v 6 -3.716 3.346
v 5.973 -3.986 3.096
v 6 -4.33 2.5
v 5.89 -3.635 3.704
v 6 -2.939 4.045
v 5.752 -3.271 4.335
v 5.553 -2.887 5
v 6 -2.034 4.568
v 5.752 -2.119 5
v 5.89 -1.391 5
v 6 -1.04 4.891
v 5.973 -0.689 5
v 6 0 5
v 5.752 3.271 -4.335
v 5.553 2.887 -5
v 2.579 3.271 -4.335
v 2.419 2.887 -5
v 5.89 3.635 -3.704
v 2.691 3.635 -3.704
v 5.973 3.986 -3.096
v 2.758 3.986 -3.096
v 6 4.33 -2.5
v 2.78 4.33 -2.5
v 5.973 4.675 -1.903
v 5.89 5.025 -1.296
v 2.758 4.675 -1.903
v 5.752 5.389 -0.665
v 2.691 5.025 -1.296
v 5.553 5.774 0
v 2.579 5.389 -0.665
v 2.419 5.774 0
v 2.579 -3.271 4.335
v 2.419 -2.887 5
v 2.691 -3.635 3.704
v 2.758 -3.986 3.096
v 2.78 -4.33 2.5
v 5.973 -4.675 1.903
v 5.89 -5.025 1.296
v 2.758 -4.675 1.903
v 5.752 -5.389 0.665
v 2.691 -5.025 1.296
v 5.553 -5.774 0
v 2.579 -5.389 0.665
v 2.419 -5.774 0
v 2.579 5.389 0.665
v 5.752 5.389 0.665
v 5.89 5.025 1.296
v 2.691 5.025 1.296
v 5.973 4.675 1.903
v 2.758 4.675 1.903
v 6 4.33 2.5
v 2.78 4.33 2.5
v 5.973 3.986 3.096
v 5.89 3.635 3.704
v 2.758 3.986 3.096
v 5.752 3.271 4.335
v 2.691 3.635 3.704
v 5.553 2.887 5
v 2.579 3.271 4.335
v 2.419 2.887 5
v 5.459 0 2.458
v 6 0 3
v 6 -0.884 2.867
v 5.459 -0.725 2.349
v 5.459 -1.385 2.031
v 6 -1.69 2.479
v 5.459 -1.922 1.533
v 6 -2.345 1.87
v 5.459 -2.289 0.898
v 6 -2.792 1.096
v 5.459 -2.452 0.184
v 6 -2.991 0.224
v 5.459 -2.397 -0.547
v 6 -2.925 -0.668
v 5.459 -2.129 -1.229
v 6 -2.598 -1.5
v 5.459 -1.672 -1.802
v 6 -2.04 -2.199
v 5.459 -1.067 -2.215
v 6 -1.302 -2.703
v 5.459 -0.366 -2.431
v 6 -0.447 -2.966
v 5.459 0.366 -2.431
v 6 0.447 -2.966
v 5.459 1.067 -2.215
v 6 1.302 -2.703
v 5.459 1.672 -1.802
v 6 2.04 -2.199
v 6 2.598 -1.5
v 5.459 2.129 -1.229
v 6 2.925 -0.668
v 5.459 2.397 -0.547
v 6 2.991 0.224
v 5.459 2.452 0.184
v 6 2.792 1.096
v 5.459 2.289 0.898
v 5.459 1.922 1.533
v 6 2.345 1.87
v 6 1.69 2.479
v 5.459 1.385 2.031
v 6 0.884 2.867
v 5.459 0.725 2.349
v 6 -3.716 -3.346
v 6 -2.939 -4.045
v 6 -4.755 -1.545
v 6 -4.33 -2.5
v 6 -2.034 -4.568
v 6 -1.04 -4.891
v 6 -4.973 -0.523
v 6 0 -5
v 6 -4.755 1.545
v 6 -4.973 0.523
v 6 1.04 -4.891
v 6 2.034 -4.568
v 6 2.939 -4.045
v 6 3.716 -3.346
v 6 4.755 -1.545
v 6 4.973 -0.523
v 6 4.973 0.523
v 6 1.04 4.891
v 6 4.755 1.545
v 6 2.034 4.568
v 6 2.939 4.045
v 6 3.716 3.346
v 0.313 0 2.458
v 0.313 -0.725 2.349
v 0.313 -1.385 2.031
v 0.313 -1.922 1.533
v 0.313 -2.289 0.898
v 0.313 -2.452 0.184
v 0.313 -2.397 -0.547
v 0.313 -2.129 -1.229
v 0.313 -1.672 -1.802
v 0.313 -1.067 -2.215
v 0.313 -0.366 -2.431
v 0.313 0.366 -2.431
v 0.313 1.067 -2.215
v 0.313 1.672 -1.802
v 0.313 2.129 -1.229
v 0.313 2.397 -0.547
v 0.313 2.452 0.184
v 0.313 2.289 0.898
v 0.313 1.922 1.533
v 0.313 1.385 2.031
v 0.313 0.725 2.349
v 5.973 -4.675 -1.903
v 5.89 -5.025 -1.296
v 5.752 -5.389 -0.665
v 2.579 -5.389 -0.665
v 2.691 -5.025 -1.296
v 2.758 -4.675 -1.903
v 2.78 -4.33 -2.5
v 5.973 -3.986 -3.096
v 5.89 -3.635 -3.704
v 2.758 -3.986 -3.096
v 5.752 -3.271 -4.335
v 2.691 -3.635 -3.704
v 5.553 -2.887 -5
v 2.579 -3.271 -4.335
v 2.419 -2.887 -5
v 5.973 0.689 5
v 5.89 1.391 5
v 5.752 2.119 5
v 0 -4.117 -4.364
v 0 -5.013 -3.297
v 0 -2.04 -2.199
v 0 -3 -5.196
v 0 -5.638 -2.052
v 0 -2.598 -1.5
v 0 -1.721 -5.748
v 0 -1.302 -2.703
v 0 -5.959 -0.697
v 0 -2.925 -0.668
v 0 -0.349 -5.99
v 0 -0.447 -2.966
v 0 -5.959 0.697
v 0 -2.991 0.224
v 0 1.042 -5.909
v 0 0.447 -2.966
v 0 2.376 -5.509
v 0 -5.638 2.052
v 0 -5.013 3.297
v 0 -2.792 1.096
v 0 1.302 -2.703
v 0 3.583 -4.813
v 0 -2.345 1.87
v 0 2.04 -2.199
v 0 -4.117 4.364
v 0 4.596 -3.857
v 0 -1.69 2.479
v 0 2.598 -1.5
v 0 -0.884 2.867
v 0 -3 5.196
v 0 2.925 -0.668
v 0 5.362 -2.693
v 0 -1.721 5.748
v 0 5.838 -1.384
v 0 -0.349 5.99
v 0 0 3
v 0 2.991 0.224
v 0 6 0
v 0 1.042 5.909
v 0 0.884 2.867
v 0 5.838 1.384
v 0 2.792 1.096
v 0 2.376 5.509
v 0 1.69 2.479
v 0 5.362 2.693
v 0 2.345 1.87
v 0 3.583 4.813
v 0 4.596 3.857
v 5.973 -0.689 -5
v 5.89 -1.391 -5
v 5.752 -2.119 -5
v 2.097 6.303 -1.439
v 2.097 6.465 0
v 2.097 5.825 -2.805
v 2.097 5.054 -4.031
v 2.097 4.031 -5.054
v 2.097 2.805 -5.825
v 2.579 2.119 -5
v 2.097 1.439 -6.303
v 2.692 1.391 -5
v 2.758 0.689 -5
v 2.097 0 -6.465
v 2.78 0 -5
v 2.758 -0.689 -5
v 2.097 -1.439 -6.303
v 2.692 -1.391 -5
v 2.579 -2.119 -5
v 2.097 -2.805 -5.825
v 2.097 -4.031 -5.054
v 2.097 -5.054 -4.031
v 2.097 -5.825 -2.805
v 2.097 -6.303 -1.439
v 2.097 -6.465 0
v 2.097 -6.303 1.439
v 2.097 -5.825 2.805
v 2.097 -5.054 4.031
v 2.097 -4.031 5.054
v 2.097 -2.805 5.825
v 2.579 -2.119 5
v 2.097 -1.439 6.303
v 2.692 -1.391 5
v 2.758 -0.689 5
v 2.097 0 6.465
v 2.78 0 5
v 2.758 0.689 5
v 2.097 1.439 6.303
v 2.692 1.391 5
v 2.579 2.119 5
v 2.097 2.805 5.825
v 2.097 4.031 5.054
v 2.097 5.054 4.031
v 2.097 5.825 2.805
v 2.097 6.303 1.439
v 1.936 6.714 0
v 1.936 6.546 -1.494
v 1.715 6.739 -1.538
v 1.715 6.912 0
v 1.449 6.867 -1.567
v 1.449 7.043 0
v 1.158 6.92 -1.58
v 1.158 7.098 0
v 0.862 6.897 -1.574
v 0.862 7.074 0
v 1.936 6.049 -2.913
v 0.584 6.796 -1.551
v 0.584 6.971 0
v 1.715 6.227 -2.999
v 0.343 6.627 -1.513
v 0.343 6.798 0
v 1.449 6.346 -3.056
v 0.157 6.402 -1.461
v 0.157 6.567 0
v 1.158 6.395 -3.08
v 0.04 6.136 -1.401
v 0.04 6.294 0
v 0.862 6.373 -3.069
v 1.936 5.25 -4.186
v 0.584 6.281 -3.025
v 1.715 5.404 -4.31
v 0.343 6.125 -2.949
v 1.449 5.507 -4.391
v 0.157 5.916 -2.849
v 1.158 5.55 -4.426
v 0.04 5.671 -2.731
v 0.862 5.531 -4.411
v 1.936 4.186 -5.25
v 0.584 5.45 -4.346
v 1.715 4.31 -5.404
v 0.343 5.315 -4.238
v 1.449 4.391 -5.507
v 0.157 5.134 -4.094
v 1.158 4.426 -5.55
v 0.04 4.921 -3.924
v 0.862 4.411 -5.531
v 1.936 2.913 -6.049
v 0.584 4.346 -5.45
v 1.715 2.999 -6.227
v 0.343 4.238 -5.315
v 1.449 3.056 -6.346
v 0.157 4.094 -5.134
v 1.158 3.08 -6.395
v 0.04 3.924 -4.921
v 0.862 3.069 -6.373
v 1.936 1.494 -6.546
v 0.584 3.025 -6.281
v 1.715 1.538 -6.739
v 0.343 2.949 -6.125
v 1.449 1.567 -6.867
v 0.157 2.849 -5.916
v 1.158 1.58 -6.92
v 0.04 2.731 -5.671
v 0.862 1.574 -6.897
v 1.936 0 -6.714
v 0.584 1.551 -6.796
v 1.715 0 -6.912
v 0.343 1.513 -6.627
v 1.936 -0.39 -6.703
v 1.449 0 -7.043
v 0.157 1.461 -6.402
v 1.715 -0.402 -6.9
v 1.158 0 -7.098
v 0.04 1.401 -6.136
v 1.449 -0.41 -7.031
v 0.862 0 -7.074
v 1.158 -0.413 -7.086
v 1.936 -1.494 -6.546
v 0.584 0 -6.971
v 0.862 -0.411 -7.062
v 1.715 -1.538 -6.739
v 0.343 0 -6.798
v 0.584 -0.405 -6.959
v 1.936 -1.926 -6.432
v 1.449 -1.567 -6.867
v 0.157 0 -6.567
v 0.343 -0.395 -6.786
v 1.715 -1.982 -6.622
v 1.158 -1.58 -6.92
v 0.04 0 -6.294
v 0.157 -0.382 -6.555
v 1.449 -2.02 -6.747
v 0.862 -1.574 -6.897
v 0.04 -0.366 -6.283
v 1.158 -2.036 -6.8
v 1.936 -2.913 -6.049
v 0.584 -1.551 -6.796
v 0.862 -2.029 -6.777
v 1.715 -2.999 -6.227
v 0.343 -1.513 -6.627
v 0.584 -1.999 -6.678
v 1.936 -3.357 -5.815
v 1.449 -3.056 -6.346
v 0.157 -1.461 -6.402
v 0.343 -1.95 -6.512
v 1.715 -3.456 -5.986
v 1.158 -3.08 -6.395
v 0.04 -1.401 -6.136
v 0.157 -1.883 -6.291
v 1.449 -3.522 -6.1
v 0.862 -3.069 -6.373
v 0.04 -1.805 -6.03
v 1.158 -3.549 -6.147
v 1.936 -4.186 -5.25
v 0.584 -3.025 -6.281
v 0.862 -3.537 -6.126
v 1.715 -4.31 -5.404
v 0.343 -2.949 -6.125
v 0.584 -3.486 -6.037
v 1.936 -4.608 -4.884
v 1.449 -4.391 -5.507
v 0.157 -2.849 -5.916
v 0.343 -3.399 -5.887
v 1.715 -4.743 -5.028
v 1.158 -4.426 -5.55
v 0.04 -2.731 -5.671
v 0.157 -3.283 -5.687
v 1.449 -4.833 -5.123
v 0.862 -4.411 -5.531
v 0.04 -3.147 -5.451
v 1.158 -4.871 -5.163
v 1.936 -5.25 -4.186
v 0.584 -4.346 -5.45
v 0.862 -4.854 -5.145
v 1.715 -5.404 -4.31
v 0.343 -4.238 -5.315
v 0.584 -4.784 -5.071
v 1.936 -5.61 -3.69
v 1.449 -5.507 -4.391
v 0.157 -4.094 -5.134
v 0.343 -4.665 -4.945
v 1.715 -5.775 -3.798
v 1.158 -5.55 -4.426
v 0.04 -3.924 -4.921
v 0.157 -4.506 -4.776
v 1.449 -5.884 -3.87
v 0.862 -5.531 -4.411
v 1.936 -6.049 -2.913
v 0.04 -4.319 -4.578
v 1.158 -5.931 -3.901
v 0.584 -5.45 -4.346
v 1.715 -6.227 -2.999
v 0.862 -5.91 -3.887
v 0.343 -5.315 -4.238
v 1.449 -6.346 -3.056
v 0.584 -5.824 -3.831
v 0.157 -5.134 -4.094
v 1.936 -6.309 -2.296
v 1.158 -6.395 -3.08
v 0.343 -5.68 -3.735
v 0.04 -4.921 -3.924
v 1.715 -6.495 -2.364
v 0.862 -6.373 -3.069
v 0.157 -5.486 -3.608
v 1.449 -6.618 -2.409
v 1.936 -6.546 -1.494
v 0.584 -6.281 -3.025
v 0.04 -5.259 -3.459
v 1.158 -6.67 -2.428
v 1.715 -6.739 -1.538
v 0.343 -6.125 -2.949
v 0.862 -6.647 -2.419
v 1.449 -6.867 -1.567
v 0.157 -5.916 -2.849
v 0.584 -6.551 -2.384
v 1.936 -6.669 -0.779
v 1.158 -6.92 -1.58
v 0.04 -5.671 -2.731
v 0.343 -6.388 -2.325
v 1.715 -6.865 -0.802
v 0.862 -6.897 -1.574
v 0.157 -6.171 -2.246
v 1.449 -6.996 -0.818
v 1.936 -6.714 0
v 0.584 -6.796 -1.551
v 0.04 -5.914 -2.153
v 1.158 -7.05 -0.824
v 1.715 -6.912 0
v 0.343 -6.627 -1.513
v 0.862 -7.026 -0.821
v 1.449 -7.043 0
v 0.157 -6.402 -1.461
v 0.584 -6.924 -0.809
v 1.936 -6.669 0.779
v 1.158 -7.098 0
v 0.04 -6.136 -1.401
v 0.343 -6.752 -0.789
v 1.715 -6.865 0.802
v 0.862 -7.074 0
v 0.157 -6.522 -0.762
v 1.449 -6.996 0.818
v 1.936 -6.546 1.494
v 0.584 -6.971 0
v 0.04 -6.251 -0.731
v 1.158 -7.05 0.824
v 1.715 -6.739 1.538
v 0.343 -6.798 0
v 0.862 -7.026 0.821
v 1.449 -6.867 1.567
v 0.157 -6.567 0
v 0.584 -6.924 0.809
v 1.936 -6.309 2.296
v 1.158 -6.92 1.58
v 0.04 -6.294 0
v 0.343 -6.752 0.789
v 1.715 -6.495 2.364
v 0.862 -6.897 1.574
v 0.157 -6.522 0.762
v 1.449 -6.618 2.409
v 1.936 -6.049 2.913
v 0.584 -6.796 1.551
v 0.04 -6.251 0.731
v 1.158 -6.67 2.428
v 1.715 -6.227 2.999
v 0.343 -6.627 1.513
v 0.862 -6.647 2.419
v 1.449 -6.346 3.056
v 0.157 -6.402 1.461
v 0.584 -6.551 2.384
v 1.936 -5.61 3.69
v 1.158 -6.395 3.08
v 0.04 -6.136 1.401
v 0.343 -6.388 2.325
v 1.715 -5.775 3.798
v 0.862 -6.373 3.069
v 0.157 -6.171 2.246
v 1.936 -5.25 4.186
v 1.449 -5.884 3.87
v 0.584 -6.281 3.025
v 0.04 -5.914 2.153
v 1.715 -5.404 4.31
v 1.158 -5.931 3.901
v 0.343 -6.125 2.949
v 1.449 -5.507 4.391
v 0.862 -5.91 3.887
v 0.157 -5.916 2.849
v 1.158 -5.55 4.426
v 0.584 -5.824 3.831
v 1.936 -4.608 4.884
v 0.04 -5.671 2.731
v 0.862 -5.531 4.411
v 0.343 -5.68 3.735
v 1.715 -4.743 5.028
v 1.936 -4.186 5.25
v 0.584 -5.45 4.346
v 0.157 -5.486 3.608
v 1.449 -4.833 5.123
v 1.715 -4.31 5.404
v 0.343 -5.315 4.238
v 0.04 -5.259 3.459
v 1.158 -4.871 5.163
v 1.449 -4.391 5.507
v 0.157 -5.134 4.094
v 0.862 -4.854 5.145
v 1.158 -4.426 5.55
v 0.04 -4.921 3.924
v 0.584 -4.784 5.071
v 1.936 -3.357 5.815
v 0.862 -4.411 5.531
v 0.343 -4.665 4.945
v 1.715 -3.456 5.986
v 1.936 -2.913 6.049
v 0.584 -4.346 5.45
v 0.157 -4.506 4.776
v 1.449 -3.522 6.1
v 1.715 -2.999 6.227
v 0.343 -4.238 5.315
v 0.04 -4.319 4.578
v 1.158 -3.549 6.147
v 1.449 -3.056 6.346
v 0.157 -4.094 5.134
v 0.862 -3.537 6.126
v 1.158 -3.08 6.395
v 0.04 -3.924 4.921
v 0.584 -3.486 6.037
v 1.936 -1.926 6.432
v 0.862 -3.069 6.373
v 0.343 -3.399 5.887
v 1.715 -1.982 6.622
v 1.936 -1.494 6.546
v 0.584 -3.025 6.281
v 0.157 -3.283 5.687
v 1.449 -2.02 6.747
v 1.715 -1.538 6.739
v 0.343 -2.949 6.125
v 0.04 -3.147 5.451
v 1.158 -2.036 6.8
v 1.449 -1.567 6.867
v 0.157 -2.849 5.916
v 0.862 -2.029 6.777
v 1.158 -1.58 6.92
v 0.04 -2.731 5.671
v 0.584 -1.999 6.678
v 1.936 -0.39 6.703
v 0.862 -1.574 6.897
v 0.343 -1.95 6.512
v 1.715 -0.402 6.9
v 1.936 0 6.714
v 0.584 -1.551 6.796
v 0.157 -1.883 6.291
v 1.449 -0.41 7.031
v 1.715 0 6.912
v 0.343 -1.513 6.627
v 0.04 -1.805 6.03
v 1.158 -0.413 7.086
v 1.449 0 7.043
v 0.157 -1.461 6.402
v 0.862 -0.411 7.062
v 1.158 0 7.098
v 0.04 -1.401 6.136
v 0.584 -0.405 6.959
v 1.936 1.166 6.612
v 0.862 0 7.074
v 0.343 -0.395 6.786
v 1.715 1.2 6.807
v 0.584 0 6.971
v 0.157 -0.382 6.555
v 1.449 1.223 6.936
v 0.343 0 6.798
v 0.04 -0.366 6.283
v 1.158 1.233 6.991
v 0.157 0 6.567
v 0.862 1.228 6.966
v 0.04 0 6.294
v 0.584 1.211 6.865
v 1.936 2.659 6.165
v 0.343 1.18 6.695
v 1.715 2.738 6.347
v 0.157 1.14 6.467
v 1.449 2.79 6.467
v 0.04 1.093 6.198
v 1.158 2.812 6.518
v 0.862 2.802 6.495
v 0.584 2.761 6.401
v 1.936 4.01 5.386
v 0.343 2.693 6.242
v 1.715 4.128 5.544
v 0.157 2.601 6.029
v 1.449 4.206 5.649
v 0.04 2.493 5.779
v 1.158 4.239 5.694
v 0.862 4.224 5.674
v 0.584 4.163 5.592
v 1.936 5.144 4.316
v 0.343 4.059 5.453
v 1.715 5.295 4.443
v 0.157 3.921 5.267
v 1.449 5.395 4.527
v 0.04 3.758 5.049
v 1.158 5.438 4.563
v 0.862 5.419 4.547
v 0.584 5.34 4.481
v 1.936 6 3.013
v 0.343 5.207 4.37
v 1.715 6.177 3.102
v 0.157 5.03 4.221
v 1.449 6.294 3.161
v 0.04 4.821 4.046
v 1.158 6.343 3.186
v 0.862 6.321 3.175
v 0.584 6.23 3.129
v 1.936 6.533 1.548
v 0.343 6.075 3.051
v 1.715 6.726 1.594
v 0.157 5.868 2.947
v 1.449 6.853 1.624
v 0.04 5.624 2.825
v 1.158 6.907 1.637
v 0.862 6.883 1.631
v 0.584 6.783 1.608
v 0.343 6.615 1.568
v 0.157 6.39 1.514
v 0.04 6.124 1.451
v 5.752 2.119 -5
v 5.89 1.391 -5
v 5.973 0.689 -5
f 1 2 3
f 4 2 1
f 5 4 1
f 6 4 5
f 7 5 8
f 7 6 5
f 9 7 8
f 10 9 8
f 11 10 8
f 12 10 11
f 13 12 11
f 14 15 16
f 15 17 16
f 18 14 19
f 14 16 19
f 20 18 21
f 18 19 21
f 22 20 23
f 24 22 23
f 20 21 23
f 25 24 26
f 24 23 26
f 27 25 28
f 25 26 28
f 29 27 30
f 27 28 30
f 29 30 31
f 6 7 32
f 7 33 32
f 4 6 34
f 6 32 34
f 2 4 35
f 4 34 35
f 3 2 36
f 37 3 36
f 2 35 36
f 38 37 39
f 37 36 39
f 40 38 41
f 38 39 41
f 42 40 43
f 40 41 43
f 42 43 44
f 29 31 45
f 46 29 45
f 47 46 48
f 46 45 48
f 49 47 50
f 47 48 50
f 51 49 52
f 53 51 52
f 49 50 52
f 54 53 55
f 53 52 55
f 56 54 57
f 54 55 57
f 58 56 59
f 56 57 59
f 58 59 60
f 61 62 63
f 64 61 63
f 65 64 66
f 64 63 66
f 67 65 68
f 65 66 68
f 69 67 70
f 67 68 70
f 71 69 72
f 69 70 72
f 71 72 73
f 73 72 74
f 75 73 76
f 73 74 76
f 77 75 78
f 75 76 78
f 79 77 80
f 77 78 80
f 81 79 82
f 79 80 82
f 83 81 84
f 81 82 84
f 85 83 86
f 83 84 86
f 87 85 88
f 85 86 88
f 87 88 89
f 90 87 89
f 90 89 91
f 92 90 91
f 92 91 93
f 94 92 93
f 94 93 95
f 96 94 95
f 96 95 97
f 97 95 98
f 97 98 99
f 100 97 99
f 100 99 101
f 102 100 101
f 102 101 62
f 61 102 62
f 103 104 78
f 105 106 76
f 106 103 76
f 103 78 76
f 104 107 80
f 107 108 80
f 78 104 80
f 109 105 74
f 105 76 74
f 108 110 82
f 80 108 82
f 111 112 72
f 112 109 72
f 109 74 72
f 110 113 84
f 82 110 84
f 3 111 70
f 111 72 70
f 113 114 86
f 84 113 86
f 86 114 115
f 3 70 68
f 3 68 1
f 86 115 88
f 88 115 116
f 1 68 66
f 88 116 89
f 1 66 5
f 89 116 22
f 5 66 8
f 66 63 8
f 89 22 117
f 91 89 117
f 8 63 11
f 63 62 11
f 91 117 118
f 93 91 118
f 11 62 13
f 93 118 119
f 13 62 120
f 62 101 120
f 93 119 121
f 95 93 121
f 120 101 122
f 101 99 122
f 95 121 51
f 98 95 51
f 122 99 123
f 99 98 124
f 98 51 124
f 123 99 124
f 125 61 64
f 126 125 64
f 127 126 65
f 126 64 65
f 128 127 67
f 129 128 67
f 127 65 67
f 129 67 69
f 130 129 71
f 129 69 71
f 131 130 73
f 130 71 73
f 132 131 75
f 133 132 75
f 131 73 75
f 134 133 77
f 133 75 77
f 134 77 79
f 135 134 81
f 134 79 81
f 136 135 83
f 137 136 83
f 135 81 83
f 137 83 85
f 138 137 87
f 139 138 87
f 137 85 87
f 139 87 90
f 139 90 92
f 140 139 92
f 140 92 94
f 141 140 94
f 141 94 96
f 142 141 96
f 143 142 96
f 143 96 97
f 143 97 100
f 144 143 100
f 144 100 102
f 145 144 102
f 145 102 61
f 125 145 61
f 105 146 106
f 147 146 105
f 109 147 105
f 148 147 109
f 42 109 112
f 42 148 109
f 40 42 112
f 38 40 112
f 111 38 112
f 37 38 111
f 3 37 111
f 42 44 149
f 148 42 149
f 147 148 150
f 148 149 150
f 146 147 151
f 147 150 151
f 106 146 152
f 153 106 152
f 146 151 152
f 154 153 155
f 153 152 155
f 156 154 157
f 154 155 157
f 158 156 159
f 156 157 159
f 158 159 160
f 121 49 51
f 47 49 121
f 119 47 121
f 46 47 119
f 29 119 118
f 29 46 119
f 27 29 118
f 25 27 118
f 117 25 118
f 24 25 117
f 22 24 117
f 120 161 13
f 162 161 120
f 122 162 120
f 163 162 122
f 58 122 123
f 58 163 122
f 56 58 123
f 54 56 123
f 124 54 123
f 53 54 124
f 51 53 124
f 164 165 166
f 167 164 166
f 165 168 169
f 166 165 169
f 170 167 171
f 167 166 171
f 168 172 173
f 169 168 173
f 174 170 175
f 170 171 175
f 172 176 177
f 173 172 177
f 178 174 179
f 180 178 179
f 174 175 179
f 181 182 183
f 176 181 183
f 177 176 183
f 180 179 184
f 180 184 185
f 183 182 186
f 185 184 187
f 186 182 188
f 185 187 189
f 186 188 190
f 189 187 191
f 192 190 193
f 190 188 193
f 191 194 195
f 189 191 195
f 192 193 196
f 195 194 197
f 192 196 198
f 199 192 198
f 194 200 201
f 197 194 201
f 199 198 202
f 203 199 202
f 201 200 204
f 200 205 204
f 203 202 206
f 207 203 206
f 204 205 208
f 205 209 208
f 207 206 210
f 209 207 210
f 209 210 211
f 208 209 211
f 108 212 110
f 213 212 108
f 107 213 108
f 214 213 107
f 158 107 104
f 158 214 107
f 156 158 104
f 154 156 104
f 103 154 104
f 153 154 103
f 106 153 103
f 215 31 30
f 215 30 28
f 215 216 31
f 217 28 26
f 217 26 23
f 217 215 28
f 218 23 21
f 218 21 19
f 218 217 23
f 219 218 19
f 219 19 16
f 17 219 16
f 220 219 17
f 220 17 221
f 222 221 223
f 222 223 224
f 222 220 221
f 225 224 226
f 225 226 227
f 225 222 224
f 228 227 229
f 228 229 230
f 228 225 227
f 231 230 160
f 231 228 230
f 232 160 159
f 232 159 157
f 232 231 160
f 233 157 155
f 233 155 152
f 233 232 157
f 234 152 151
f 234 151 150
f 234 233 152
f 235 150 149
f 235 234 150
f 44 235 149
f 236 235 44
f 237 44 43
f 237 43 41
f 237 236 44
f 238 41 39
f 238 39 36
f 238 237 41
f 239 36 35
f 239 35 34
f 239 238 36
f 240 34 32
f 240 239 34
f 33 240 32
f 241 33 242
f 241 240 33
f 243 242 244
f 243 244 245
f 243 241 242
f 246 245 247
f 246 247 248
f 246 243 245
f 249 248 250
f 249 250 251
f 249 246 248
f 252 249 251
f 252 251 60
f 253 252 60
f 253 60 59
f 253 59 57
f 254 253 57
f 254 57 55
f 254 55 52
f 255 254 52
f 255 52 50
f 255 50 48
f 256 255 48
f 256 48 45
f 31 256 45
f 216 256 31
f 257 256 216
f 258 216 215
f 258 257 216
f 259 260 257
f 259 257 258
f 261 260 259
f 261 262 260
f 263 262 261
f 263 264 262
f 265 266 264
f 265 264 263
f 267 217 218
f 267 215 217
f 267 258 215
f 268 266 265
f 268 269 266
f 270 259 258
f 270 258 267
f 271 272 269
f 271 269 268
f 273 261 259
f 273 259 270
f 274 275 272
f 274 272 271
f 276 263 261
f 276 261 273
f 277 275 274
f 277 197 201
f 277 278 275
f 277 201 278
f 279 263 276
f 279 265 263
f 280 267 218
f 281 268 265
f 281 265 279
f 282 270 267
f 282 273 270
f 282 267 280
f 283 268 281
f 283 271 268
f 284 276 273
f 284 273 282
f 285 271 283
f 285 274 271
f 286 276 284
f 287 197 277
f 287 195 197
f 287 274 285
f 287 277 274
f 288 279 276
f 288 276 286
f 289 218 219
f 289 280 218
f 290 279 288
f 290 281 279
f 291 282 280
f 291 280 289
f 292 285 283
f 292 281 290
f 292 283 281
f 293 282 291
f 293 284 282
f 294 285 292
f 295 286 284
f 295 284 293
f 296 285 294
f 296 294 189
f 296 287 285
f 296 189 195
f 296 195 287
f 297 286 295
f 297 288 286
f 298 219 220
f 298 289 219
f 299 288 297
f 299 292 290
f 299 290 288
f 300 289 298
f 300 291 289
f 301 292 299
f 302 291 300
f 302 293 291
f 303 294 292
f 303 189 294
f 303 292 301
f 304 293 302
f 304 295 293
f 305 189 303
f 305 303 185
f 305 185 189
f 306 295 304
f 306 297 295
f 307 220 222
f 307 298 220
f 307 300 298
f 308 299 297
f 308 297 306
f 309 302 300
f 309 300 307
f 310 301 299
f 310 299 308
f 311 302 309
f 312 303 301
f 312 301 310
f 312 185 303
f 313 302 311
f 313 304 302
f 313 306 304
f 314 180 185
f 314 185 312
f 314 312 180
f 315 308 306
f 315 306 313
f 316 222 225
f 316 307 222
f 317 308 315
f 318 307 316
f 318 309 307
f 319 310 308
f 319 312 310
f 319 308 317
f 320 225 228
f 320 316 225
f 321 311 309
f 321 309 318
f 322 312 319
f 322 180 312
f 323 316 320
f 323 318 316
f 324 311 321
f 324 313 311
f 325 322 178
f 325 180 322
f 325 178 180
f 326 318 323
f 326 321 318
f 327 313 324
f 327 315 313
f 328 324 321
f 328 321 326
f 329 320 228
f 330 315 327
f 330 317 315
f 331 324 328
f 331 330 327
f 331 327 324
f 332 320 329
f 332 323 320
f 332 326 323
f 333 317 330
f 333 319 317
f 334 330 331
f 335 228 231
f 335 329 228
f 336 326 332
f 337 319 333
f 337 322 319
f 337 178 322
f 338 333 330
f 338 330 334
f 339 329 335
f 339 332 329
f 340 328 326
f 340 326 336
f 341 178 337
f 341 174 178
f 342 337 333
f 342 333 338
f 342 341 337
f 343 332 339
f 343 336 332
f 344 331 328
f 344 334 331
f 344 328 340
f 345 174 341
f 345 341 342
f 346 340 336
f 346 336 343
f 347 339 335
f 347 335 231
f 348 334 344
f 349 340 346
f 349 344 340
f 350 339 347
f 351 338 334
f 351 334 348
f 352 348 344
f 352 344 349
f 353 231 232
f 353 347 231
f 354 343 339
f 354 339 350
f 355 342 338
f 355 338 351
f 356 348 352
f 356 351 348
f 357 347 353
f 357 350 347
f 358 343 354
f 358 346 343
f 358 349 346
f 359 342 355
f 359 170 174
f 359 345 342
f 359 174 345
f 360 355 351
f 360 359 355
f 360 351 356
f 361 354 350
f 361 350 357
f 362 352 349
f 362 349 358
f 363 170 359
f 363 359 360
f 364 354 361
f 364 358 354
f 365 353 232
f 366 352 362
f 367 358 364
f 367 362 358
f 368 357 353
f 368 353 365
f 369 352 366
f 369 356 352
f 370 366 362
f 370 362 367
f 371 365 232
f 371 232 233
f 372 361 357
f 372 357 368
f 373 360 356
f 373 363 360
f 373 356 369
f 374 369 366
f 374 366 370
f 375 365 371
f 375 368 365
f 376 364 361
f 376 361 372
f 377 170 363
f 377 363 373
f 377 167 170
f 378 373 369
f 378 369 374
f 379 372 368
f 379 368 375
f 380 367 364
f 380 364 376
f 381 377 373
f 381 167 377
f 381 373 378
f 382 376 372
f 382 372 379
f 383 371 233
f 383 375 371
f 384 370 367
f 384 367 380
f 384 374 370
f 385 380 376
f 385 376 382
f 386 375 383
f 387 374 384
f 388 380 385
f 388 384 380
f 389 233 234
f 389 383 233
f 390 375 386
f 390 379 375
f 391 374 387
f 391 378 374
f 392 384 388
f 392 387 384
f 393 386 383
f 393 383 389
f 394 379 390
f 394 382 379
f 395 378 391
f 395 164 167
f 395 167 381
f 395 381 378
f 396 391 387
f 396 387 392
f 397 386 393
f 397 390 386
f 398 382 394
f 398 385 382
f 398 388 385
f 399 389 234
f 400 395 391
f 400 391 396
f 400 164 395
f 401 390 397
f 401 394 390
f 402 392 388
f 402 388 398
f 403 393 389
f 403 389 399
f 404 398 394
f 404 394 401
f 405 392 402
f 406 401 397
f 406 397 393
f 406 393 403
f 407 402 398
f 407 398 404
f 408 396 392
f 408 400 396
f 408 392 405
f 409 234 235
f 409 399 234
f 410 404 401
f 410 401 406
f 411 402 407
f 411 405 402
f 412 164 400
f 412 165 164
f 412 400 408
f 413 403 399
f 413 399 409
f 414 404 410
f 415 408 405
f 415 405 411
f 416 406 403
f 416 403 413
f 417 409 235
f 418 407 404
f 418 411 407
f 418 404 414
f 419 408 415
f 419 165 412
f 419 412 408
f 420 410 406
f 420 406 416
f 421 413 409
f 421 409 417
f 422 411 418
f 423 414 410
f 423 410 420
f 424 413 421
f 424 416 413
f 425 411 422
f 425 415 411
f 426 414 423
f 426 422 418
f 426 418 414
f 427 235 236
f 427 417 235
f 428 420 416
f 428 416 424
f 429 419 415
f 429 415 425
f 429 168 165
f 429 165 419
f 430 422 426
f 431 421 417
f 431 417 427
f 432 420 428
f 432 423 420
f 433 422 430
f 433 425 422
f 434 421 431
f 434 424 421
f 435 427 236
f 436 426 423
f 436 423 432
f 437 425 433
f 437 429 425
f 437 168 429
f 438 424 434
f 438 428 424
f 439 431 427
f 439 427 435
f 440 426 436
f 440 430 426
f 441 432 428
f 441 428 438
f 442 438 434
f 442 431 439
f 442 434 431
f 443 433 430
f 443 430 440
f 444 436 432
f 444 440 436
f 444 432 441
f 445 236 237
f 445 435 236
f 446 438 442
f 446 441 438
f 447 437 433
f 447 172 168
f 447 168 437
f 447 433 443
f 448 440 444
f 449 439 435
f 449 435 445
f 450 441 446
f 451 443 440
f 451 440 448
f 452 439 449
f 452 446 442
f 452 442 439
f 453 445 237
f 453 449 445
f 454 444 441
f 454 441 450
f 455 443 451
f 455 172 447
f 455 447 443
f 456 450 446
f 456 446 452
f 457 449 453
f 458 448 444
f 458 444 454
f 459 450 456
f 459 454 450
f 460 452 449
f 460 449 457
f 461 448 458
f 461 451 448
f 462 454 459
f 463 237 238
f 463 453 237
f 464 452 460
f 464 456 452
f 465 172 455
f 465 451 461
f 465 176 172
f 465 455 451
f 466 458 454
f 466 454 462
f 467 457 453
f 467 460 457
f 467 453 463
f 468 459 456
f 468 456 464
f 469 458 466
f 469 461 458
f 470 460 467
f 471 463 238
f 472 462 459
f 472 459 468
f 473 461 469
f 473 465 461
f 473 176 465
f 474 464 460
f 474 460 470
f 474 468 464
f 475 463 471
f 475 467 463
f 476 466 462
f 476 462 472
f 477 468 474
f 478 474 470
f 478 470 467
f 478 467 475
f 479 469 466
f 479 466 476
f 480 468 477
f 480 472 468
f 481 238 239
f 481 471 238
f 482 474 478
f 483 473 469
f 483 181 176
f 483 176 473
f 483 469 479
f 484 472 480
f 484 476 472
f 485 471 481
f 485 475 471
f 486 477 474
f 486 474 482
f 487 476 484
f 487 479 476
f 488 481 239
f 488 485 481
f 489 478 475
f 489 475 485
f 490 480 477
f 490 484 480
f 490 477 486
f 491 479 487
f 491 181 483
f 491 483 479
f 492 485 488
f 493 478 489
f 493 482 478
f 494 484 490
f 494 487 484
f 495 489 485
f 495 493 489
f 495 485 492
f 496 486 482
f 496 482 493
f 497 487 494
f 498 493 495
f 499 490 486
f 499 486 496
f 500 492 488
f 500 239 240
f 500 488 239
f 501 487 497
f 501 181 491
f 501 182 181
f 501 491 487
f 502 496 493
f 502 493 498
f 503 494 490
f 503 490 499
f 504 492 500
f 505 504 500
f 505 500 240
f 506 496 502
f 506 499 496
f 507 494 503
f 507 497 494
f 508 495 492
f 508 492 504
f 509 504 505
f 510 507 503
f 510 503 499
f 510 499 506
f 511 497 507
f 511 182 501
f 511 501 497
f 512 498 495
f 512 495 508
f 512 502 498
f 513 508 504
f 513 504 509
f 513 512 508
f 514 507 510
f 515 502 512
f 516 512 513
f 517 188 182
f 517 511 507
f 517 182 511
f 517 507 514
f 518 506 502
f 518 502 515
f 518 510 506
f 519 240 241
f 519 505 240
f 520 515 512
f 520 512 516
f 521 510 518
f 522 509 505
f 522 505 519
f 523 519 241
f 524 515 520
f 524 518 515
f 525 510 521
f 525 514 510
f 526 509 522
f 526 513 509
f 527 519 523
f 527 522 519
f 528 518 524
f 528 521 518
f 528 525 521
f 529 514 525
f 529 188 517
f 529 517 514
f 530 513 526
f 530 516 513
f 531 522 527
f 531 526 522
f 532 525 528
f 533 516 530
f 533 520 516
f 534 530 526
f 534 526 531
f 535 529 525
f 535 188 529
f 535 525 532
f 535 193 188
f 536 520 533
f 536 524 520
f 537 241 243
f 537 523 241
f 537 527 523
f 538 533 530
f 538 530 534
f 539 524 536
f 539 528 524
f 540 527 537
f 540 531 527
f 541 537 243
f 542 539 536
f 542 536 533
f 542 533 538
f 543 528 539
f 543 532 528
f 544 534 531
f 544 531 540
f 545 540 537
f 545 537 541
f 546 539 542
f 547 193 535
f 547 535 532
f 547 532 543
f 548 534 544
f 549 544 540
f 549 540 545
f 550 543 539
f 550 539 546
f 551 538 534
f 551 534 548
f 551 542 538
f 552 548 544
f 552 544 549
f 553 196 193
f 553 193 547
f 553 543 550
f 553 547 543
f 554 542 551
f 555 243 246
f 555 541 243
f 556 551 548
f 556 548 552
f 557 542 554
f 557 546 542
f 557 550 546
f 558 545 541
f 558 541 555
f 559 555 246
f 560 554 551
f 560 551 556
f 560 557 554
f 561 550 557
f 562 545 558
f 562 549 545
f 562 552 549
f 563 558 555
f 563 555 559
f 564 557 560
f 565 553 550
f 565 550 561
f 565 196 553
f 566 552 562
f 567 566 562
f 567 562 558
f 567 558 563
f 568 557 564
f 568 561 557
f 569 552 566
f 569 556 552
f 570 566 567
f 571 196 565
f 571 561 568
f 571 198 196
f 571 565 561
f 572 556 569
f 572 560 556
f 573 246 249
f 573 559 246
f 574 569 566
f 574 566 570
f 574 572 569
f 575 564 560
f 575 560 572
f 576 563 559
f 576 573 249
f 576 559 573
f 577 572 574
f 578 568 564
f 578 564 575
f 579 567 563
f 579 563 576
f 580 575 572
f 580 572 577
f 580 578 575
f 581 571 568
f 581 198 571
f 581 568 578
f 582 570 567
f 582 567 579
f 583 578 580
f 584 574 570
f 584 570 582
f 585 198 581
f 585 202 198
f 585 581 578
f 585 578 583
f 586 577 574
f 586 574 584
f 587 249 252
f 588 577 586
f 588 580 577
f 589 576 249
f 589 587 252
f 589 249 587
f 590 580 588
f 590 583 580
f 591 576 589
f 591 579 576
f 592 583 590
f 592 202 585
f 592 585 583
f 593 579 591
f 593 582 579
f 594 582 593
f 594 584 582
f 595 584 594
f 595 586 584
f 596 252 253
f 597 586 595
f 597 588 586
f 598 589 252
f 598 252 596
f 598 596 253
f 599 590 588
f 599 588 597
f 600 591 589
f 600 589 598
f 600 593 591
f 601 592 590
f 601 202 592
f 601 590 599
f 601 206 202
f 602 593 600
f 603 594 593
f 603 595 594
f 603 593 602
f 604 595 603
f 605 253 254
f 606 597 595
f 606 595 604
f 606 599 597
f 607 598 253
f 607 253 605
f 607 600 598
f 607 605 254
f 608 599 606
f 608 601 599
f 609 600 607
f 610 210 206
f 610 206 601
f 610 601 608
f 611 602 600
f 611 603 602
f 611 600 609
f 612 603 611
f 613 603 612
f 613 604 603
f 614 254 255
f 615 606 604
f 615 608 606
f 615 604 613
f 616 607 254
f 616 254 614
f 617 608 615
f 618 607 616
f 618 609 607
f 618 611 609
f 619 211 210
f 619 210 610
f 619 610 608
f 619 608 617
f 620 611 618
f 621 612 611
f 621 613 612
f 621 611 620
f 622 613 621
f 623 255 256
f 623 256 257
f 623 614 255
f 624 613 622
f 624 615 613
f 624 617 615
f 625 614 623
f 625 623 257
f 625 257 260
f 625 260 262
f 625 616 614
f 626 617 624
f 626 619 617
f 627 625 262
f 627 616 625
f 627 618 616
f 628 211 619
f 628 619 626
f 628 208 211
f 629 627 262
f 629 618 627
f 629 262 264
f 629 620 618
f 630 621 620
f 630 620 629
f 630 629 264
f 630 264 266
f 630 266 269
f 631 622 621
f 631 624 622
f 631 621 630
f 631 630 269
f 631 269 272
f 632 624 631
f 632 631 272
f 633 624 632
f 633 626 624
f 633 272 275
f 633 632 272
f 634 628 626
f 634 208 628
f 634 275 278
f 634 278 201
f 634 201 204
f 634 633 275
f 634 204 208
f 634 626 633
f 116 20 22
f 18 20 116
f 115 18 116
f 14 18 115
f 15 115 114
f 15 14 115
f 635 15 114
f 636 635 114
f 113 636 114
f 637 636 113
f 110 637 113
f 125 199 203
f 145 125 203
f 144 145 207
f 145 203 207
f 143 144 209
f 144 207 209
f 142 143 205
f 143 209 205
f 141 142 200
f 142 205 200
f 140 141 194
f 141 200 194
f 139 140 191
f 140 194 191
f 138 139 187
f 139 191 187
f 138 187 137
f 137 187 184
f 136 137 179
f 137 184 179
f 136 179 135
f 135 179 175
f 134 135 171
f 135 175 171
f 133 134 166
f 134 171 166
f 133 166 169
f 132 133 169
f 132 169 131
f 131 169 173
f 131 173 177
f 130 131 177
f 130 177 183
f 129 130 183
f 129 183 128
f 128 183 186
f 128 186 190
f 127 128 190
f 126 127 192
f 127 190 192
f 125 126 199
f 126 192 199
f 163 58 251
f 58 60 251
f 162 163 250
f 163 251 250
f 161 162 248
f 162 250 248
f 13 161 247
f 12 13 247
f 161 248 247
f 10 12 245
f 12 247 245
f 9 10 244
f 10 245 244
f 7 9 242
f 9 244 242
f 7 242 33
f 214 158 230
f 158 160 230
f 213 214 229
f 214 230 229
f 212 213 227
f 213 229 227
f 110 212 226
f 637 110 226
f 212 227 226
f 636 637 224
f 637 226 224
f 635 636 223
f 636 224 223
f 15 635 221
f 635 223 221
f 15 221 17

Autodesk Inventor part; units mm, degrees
ref_plane "YZ Plane" through (0, 0, 0) normal (1, 0, 0) x (0, 1, 0)
ref_plane "XZ Plane" through (0, 0, 0) normal (0, 1, 0) x (-1, 0, 0)
sketch "Sketch1" plane through (0, 0, 0) normal (0, 0, 1) x (1, 0, 0)
  line L0 (-1.4239, 0) -> (7.2373, 0) projected
  line L1 (2.78, 5) -> (2.0969, 6.4649)
  line L2 (2.78, 5) -> (6, 5) construction
  line L3 (6, 5) -> (6, 0) construction
  arc A0 (2.0969, 6.4649) -> (0, 6) centre (1.1, 6) ccw
  line L4 (2.78, 5) -> (2.78, 0)
  line L5 (0, -1.4613) -> (0, 8.7676) projected
  point P0 (0, 0)
  dimension "d2" = 10
  dimension "d4" = 14.2
  dimension "d5" = 1.1
  dimension "d15" = 6
  dimension "d16" = 25
revolve "Ring" add sketch "Sketch1" angle 360 about axis through (-10, 0, 0) along (1, 0, 0)
sketch "Sketch2" plane through (0, 0, 0) normal (-1, 0, 0) x (0, 0, 1)
  circle A0 centre (0, 0) radius 4.9
  line L0 (-5, -2.8868) -> (-5, 2.8868)
  line L1 (-5, 2.8868) -> (0, 5.7735)
  line L2 (0, 5.7735) -> (5, 2.8868)
  line L3 (5, 2.8868) -> (5, -2.8868)
  line L4 (5, -2.8868) -> (0, -5.7735)
  line L5 (0, -5.7735) -> (-5, -2.8868)
  circle A1 centre (0, 0) radius 6 projected
  dimension "d6" = 11.547
extrude "Body" add sketch "Sketch2" against normal blind 6 contours A0 | L0 L1 L2 L3 L4 L5
sketch "Sketch3" plane through (0, 0, 0) normal (0, 0, 1) x (1, 0, 0)
  line L0 (2.4193, 5.7735) -> (6, 5.7735) projected
  line L1 (6, 2.8868) -> (6, 5.7735) projected
  line L2 (0, -6) -> (0, 6) projected
  line L3 (-1.2, 0) -> (7.2, 0) projected
  line L4 (5.5534, 5.7735) -> (6, 5)
  dimension "d10" = 30
  dimension "d11" = 10
revolve "Chamfer1" cut sketch "Sketch3" angle 360 about axis through (-10, 0, 0) along (1, 0, 0)
sketch "Sketch4" plane through (0, 0, 0) normal (-1, 0, 0) x (0, 0, 1)
  circle A0 centre (0, 0) radius 6 projected
hole "Thread" at (0, 0, 0) direction (1, 0, 0) diameter 4.917 end through all thread size "M6x1" class "6H" standard "ISO Metric profile"
chamfer "Chamfer2" distance 0.5413 angle 30 1 edges at (0, 0, -2.4585) measured on face at (0, 4.7554, -0.5774)
ref_plane "Work Plane1" through (20.959, 0, 0) normal (0, 0, -1) x (-1, 0, 0)
chamfer "Chamfer3" distance 0.5413 angle 45 1 edges at (6, 0, -2.4585)
equation "\"d2\" = SW"
equation "\"d4\" = LADI"
equation "\"d5\" = PHH"
equation "\"d15\" = KOH"
equation "\"d16\" = KEWI"
equation "\"d6\" = 1.1547 * SW"
equation "\"d7\" = KOH"
equation "\"d10\" = ANG1"
equation "\"d11\" = SW0"
equation "\"d12\" = -0.5 * GD1 + 0.5 * NND"
equation "\"d46\" = -0.5 * GD1 + 0.5 * NND"
equation "\"d51\" = -0.5 * GD1 + 0.5 * NND"
equation "\"ANG1\" = 30deg"
equation "\"KEWI\" = 25deg"
equation "\"NND\" = 6"
equation "\"LADI\" = 14.2"
equation "\"SW\" = 10"
equation "\"PHH\" = 1.1"
equation "\"KOH\" = NND"
equation "\"SW0\" = 10"
equation "\"d1\" = LADI"
equation "\"d3\" = PHH"
equation "\"GUL\" = 0.541266 * PTC"
equation "\"RR\" = PHH"
equation "\"THREADDIA\" = 6"
equation "\"TOA\" = 30deg"
equation "\"PTC\" = 1"
equation "\"GAL\" = 0.541266 * PTC"
equation "\"E0\" = 1.155 * SW"
equation "\"GD1\" = 4.917468"
properties part number "ISO 4161 - M6(1)" material "Stainless Steel"
